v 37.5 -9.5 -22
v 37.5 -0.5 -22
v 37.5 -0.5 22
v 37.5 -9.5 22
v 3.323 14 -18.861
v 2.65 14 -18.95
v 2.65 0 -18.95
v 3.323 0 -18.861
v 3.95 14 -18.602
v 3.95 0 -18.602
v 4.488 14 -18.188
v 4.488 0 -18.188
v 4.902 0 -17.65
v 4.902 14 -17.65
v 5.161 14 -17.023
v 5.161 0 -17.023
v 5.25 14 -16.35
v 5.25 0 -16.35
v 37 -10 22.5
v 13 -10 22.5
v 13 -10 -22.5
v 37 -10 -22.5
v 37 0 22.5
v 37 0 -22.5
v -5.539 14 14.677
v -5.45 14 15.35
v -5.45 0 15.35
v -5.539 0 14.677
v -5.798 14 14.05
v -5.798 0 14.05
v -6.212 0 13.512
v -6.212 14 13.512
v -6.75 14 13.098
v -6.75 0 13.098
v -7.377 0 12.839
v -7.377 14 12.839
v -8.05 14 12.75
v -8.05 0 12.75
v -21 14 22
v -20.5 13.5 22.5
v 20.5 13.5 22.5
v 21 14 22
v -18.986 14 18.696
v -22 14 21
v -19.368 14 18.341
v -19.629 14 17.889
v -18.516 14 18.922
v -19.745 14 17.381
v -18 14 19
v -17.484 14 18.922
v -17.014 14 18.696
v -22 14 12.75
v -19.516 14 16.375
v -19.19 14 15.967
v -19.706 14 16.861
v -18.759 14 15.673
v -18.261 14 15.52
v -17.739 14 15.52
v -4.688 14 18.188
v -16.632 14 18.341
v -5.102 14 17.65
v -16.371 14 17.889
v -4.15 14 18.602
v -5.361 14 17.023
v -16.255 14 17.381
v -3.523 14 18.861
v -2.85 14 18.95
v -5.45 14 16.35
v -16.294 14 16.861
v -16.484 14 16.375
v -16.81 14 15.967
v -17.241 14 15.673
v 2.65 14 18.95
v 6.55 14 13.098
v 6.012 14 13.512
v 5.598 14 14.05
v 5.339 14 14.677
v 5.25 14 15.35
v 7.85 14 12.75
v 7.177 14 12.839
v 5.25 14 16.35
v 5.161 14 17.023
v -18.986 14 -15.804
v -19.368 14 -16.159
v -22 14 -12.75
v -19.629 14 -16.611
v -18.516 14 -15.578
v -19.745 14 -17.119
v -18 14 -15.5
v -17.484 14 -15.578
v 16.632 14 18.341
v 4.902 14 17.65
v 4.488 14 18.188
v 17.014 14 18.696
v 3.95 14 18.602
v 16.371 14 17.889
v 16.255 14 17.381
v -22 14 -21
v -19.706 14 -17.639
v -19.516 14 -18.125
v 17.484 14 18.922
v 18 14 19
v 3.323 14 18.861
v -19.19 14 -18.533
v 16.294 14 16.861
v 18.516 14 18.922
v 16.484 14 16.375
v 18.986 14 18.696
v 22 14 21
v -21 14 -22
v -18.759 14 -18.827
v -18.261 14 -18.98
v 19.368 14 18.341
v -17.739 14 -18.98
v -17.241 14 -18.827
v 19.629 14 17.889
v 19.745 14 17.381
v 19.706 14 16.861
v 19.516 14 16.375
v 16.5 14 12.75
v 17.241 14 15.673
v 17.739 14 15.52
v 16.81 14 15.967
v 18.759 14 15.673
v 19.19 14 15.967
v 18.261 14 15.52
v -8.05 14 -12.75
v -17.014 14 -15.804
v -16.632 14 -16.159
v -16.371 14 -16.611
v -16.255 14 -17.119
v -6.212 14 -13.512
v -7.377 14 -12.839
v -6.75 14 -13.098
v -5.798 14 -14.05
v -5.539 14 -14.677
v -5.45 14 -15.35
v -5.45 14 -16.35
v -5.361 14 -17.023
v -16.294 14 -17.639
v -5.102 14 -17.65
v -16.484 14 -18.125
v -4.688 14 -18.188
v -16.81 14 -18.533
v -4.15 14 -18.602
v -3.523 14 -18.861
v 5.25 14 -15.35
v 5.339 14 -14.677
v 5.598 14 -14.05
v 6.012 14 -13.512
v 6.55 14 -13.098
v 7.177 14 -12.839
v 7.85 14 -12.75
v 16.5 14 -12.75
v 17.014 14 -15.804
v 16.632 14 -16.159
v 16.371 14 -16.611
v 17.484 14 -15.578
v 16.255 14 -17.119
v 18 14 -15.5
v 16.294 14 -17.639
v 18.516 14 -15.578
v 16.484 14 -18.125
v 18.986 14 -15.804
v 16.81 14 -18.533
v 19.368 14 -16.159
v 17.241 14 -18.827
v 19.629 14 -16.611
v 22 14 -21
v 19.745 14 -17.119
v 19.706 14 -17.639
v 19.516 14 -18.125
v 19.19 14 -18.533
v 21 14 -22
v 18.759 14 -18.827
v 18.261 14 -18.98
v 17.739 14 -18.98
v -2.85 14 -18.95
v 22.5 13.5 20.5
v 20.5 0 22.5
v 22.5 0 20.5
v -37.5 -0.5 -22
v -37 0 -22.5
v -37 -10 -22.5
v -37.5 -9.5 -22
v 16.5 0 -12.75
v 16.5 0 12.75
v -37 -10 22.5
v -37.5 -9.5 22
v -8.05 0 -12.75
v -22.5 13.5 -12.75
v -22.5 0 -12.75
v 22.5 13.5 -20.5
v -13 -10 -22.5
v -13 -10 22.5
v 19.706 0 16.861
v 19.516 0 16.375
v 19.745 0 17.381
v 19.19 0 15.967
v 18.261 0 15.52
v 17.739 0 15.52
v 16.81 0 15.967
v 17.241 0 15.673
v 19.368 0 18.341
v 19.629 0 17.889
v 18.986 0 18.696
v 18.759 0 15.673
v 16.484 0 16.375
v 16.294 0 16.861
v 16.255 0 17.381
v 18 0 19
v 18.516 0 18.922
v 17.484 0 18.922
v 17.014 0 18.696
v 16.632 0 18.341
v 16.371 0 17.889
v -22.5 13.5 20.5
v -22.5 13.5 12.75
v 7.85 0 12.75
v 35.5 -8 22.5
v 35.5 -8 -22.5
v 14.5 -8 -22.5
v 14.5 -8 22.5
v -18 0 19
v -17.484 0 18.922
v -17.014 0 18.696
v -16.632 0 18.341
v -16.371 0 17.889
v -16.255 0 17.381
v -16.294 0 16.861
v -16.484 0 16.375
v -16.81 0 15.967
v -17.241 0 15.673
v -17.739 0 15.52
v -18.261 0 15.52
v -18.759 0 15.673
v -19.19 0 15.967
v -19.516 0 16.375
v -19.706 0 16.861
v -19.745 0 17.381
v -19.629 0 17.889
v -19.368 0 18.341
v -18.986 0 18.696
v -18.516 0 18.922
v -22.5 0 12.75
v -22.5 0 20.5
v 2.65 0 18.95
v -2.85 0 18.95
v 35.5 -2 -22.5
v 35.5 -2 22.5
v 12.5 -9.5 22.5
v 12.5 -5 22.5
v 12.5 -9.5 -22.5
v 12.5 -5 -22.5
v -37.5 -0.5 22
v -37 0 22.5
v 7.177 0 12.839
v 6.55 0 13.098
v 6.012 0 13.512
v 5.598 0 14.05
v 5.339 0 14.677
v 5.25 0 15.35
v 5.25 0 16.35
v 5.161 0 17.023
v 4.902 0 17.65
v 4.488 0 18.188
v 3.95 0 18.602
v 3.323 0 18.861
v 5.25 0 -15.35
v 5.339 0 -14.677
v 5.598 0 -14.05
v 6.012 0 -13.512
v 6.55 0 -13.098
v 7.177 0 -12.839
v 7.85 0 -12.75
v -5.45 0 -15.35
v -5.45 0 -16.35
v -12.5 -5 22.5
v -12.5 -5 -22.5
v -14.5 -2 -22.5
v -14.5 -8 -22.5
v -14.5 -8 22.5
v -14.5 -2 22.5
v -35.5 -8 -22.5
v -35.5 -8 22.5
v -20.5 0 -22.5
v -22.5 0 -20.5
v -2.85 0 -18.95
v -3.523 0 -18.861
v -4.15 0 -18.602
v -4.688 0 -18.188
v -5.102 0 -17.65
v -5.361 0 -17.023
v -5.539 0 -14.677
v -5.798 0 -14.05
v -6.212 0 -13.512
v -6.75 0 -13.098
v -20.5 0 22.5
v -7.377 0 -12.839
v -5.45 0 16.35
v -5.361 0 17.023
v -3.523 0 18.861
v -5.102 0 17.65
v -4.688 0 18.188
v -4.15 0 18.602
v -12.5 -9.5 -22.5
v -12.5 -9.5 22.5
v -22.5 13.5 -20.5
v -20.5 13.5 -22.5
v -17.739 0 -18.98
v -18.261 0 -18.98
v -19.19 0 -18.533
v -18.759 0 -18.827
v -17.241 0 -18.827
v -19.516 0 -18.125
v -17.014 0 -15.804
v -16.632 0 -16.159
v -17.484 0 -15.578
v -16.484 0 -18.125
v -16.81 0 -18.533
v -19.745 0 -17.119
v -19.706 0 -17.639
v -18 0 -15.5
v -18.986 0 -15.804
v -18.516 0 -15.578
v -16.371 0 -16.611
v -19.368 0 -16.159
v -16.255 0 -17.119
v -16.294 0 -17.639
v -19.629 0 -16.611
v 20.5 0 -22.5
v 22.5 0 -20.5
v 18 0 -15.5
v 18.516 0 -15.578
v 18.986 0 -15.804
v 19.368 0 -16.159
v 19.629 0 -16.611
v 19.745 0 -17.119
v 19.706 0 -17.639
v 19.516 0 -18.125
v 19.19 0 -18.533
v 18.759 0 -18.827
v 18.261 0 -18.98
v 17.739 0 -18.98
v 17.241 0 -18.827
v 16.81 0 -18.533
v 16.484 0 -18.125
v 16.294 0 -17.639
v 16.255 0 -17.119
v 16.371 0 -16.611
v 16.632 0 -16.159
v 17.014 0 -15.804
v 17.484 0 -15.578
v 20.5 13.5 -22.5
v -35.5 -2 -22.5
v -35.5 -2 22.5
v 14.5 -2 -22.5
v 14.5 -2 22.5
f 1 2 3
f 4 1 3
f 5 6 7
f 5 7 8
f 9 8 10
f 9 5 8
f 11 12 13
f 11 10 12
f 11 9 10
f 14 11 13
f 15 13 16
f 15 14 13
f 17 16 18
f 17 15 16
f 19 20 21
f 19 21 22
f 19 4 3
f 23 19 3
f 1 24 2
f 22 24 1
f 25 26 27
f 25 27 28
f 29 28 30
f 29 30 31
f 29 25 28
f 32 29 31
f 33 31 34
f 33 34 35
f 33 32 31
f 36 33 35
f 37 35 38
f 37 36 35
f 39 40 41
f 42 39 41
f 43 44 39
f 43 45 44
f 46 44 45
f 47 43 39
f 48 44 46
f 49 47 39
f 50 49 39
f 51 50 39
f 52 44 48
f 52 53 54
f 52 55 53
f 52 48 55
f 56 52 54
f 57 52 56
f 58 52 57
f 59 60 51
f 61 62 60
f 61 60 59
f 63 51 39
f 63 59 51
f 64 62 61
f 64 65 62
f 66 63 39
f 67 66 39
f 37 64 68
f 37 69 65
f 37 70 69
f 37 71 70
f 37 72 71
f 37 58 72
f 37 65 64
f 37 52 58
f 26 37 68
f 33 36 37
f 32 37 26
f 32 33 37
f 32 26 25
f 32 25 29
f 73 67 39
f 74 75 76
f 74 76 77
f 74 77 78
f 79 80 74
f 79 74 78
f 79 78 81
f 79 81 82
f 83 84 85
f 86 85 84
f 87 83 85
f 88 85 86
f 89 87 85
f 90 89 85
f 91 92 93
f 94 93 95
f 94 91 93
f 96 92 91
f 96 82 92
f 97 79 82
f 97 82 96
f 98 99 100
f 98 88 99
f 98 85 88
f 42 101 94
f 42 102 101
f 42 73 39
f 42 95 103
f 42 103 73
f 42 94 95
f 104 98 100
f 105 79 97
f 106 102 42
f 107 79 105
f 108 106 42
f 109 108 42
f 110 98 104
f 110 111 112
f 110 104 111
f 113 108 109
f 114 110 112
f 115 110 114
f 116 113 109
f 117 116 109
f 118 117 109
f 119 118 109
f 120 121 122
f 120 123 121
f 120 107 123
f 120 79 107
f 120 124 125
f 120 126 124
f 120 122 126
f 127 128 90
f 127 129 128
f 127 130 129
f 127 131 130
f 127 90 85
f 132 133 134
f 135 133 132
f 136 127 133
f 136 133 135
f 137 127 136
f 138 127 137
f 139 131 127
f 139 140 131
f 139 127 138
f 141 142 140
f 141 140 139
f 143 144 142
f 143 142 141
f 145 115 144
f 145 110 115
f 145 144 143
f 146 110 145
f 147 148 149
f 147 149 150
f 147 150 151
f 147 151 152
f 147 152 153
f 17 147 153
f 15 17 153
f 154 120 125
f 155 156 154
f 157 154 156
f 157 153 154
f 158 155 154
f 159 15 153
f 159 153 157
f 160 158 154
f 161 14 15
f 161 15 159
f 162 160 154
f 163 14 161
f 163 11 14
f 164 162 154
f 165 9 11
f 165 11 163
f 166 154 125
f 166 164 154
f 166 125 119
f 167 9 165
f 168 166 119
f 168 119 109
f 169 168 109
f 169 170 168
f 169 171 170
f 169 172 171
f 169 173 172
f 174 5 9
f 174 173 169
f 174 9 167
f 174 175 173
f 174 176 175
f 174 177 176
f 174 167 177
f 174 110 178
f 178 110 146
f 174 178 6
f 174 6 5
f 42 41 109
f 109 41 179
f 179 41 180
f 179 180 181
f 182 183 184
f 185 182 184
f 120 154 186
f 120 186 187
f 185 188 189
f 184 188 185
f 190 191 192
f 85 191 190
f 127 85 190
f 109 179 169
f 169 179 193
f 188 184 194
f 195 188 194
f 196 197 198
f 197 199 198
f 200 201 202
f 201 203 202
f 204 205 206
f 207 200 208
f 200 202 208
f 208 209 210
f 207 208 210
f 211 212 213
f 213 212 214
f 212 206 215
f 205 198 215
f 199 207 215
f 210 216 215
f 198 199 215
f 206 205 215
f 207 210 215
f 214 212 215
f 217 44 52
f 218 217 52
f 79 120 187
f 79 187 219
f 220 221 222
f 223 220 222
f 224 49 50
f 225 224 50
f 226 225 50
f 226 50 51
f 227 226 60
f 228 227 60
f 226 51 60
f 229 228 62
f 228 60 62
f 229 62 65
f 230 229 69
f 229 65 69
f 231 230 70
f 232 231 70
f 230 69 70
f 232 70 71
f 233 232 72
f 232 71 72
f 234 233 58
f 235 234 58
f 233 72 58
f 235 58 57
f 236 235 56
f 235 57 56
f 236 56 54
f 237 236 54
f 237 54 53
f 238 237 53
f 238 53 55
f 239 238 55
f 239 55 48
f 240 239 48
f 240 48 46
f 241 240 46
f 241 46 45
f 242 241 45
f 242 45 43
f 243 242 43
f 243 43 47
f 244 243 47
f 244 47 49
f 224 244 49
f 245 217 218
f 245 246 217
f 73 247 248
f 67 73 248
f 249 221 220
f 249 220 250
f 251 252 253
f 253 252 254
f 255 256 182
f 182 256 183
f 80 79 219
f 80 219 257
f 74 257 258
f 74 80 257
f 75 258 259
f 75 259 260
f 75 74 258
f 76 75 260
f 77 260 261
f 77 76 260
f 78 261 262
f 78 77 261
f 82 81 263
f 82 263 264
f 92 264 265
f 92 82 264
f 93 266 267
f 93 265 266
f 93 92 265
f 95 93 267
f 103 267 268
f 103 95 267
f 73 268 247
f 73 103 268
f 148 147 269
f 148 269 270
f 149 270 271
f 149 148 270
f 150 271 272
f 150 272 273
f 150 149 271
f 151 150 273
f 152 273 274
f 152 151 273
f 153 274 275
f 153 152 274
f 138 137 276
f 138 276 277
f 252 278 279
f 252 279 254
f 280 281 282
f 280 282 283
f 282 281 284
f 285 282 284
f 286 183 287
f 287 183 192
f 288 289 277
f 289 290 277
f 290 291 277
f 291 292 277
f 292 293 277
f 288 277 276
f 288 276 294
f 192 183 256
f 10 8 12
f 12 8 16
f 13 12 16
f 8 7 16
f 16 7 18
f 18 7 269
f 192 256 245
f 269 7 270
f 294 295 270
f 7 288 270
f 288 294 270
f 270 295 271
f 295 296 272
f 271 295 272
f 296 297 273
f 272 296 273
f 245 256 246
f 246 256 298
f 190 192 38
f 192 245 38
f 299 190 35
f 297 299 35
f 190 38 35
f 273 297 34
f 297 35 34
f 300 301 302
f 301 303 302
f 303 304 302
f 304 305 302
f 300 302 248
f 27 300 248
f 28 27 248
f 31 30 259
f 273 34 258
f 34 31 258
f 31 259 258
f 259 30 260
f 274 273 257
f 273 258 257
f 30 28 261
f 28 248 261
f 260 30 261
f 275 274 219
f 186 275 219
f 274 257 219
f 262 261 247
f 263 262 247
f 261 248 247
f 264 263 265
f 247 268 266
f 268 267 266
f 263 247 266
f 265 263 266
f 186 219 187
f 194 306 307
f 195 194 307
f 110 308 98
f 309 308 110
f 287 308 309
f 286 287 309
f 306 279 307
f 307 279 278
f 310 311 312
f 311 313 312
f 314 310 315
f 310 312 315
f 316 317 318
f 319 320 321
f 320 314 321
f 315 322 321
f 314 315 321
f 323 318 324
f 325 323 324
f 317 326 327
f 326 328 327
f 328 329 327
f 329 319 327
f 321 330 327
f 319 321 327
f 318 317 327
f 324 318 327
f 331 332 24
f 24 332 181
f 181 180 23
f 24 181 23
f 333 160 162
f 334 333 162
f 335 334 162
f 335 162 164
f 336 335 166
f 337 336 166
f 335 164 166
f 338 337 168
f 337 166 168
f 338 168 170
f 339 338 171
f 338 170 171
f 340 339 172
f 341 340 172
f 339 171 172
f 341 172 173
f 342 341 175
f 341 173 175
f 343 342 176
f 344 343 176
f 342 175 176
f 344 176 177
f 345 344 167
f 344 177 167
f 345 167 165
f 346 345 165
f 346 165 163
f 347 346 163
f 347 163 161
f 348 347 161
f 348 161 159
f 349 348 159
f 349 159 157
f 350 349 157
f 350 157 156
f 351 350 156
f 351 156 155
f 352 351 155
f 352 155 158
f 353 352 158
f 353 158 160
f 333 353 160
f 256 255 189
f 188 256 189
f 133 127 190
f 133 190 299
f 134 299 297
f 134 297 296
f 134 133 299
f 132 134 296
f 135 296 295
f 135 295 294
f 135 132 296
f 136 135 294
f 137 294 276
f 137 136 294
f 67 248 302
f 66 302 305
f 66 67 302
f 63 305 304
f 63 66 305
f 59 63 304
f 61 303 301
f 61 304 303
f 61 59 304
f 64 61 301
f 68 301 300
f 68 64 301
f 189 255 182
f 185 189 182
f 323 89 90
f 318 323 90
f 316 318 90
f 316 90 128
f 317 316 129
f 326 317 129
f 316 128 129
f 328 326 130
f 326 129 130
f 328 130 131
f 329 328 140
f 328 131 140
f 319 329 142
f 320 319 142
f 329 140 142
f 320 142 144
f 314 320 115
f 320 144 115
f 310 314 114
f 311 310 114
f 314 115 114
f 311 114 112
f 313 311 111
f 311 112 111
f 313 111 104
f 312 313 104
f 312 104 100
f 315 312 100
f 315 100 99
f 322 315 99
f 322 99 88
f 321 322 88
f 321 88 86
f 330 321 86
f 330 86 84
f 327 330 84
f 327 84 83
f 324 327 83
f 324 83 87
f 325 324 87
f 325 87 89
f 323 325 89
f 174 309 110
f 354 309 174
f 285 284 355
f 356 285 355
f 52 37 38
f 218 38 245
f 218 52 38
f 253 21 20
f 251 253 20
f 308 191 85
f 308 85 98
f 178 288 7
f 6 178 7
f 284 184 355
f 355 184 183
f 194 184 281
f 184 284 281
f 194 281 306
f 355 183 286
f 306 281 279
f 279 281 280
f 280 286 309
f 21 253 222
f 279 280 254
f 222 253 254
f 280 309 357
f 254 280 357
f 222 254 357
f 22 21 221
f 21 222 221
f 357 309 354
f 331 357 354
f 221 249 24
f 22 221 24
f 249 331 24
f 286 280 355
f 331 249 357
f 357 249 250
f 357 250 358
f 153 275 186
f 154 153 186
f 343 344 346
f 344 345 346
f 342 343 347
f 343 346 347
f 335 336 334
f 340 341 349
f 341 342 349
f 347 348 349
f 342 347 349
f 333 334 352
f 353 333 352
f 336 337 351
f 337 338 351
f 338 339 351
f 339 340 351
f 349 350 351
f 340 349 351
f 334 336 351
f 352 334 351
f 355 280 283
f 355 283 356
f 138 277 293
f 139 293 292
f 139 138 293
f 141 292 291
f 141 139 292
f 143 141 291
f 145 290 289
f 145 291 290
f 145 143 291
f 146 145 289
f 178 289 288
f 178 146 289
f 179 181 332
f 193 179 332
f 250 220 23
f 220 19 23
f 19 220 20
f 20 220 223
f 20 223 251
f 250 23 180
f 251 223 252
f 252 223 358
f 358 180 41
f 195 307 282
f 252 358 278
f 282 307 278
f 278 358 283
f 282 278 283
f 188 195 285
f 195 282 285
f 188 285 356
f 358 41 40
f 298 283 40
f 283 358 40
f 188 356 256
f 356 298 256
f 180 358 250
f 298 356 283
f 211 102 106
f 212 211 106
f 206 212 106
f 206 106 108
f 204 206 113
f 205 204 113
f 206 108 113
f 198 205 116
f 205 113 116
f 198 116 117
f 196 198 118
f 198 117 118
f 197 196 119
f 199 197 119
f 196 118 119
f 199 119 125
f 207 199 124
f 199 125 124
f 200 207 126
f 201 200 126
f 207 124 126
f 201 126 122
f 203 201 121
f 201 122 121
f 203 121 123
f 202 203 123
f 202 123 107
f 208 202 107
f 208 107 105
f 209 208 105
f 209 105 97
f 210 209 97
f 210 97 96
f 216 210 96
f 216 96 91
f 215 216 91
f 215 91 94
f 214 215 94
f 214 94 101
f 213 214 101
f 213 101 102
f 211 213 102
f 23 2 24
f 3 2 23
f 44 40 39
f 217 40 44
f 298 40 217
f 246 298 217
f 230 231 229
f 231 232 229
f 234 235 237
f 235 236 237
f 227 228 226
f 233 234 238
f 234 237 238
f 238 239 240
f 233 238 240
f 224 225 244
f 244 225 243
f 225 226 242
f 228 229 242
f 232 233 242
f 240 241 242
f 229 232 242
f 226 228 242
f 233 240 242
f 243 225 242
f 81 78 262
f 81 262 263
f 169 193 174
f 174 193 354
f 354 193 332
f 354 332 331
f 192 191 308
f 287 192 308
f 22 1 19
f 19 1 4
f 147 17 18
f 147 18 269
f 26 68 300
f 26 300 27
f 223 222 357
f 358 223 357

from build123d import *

# Parameters (mm, degrees)
SKETCH1_W           = 45
SKETCH1_H           = 45
BOSS_EXTRUDE1_DEPTH = 14
CUT_EXTRUDE1_DEPTH  = 35.763486592
CHAMFER1_SIZE       = 0.5
CHAMFER2_SIZE       = 2
SKETCH4_R           = 1.75
CUT_EXTRUDE2_DEPTH  = 35.763486592
SKETCH5_R           = 1.75
SKETCH5_W           = 4
SKETCH5_H           = 25.5
BOSS_EXTRUDE4_DEPTH = 5
SKETCH5_3_R         = 1.75
SKETCH5_3_W         = 4
SKETCH5_3_H         = 25.5
BOSS_EXTRUDE5_DEPTH = 10
SKETCH10_W          = 21
SKETCH10_H          = 6
CUT_EXTRUDE3_DEPTH  = 50
CHAMFER5_SIZE       = 0.5


with BuildPart() as part:
    # Sketch1 → Boss-Extrude1 (new body)
    with BuildSketch(Plane(origin=(0, 0, 0), x_dir=(1, 0, 0), z_dir=(0, 1, 0))):
        Rectangle(SKETCH1_W, SKETCH1_H)
    extrude(amount=BOSS_EXTRUDE1_DEPTH)

    # Sketch3 → Cut-Extrude1 (cut, through all)
    with BuildSketch(Plane(origin=(0, 14, 0), x_dir=(1, 0, 0), z_dir=(0, 1, 0))):
        with BuildLine():
            Line((-22.5, 12.75), (-8.05, 12.75))
            ThreePointArc((-8.05, 12.75), (-6.211522369, 13.511522369), (-5.45, 15.35))
            Line((-5.45, 15.35), (-5.45, 16.35))
            ThreePointArc((-5.45, 16.35), (-4.688477631, 18.188477631), (-2.85, 18.95))
            Line((-2.85, 18.95), (2.65, 18.95))
            ThreePointArc((2.65, 18.95), (4.488477631, 18.188477631), (5.25, 16.35))
            Line((5.25, 16.35), (5.25, 15.35))
            ThreePointArc((5.25, 15.35), (6.011522369, 13.511522369), (7.85, 12.75))
            Line((7.85, 12.75), (16.5, 12.75))
            Line((16.5, 12.75), (16.5, -12.75))
            Line((16.5, -12.75), (7.85, -12.75))
            ThreePointArc((7.85, -12.75), (6.011522369, -13.511522369), (5.25, -15.35))
            Line((5.25, -15.35), (5.25, -16.35))
            ThreePointArc((5.25, -16.35), (4.488477631, -18.188477631), (2.65, -18.95))
            Line((2.65, -18.95), (-2.85, -18.95))
            ThreePointArc((-2.85, -18.95), (-4.688477631, -18.188477631), (-5.45, -16.35))
            Line((-5.45, -16.35), (-5.45, -15.35))
            ThreePointArc((-5.45, -15.35), (-6.211522369, -13.511522369), (-8.05, -12.75))
            Line((-8.05, -12.75), (-22.5, -12.75))
            Line((-22.5, -12.75), (-22.5, 12.75))
        make_face()
    extrude(amount=-CUT_EXTRUDE1_DEPTH, mode=Mode.SUBTRACT)

    # Chamfer1
    chamfer1_edges = [part.edges().sort_by_distance(p)[0] for p in [
        (-22.5, 14, -17.625),
        (0, 14, 22.5),
        (-22.5, 14, 17.625),
        (22.5, 14, 0),
        (0, 14, -22.5),
    ]]
    chamfer(chamfer1_edges, length=CHAMFER1_SIZE)

    # Chamfer2
    # the kernel refuses this chamfer: 5.464101615, 2 mm, written as the material it takes off along each edge
    # the kernel refuses this chamfer: 5.464101615, 2 mm, written as the material it takes off along each edge
    with BuildSketch(Plane(origin=(-22.5, -5.143365976, -22.5), x_dir=(-0.027495876610585647, 0, 0.9996219169112968), z_dir=(0, 1, 0)), Plane(origin=(-22.5, -5.143365976, 22.5), x_dir=(0.9996219169112968, 0, 0.027495876610585647), z_dir=(0, 1, 0))) as chamfer2_2_piece_1:
        Polygon((CHAMFER2_SIZE * 0.999621916911, CHAMFER2_SIZE * 0.0274958766106), (-CHAMFER2_SIZE * 0.0274958766106, CHAMFER2_SIZE * 0.999621916911), (0, 0), align=None)
    extrude(amount=23.786731952, mode=Mode.SUBTRACT)
    with BuildSketch(Plane(origin=(22.5, -5.143365976, 22.5), x_dir=(-0.9996219169112968, 0, 0.027495876610585647), z_dir=(0, 1, 0)), Plane(origin=(22.5, -5.143365976, -22.5), x_dir=(0.027495876610585647, 0, 0.9996219169112968), z_dir=(0, 1, 0))) as chamfer2_2_piece_2:
        Polygon((CHAMFER2_SIZE * 0.999621916911, -CHAMFER2_SIZE * 0.0274958766106), (-CHAMFER2_SIZE * 0.0274958766106, -CHAMFER2_SIZE * 0.999621916911), (0, 0), align=None)
    extrude(amount=23.786731952, mode=Mode.SUBTRACT)

    # Sketch4 → Cut-Extrude2 (cut, through all)
    with BuildSketch(Plane(origin=(0, 14, 0), x_dir=(1, 0, 0), z_dir=(0, 1, 0))):
        with Locations(Location((-18, 17.25, 0), (0, 0, 270))):
            Circle(SKETCH4_R)
        with Locations(Location((18, 17.25, 0), (0, 0, 270))):
            Circle(SKETCH4_R)
        with Locations(Location((18, -17.25, 0), (0, 0, 270))):
            Circle(SKETCH4_R)
        with Locations(Location((-18, -17.25, 0), (0, 0, 270))):
            Circle(SKETCH4_R)
    extrude(amount=-CUT_EXTRUDE2_DEPTH, mode=Mode.SUBTRACT)

    # Sketch5 → Boss-Extrude4 (add)
    # profile 1 of 13: a face of its own
    with BuildSketch(Plane.XZ):
        Polygon((-20.5, 22.5), (-37.5, 22.5), (-37.5, -22.5), (-20.5, -22.5), (-22.5, -20.5), (-22.5, -12.75), (-12.5, -12.75), (-12.5, 12.75), (-22.5, 12.75), (-22.5, 20.5), align=None)
    # profile 2 of 13: a face of its own
    with BuildSketch(Plane.XZ):
        with BuildLine():
            Line((-8.05, 12.75), (-12.5, 12.75))
            Line((-12.5, 12.75), (-12.5, -12.75))
            Line((-12.5, -12.75), (-8.05, -12.75))
            ThreePointArc((-8.05, -12.75), (-6.211522369, -13.511522369), (-5.45, -15.35))
            Line((-5.45, -15.35), (-5.45, -16.35))
            ThreePointArc((-5.45, -16.35), (-4.688477631, -18.188477631), (-2.85, -18.95))
            Line((-2.85, -18.95), (2.65, -18.95))
            ThreePointArc((2.65, -18.95), (4.488477631, -18.188477631), (5.25, -16.35))
            Line((5.25, -16.35), (5.25, -15.35))
            ThreePointArc((5.25, -15.35), (6.011522369, -13.511522369), (7.85, -12.75))
            Line((7.85, -12.75), (12.5, -12.75))
            Line((12.5, -12.75), (12.5, 12.75))
            Line((12.5, 12.75), (7.85, 12.75))
            ThreePointArc((7.85, 12.75), (6.011522369, 13.511522369), (5.25, 15.35))
            Line((5.25, 15.35), (5.25, 16.35))
            ThreePointArc((5.25, 16.35), (4.488477631, 18.188477631), (2.65, 18.95))
            Line((2.65, 18.95), (-2.85, 18.95))
            ThreePointArc((-2.85, 18.95), (-4.688477631, 18.188477631), (-5.45, 16.35))
            Line((-5.45, 16.35), (-5.45, 15.35))
            ThreePointArc((-5.45, 15.35), (-6.211522369, 13.511522369), (-8.05, 12.75))
        make_face()
    # profile 3 of 13: a face of its own
    with BuildSketch(Plane.XZ):
        with BuildLine():
            Line((12.5, 22.5), (-12.5, 22.5))
            Line((-12.5, 22.5), (-12.5, 12.75))
            Line((-12.5, 12.75), (-8.05, 12.75))
            ThreePointArc((-8.05, 12.75), (-6.211522369, 13.511522369), (-5.45, 15.35))
            Line((-5.45, 15.35), (-5.45, 16.35))
            ThreePointArc((-5.45, 16.35), (-4.688477631, 18.188477631), (-2.85, 18.95))
            Line((-2.85, 18.95), (2.65, 18.95))
            ThreePointArc((2.65, 18.95), (4.488477631, 18.188477631), (5.25, 16.35))
            Line((5.25, 16.35), (5.25, 15.35))
            ThreePointArc((5.25, 15.35), (6.011522369, 13.511522369), (7.85, 12.75))
            Line((7.85, 12.75), (12.5, 12.75))
            Line((12.5, 12.75), (12.5, 22.5))
        make_face()
    # profile 4 of 13: a face of its own
    with BuildSketch(Plane.XZ):
        Polygon((-12.5, 22.5), (-20.5, 22.5), (-22.5, 20.5), (-22.5, 12.75), (-12.5, 12.75), align=None)
        with Locations(Location((-18, 17.25, 0), (0, 0, 90))):
            Circle(SKETCH5_R, mode=Mode.SUBTRACT)
    # profile 5 of 13: a face of its own
    with BuildSketch(Plane.XZ):
        Polygon((20.5, 22.5), (12.5, 22.5), (12.5, 12.75), (16.5, 12.75), (16.5, -12.75), (12.5, -12.75), (12.5, -22.5), (20.5, -22.5), (22.5, -20.5), (22.5, 20.5), align=None)
        with Locations(Location((18, -17.25, 0), (0, 0, 90))):
            Circle(SKETCH5_R, mode=Mode.SUBTRACT)
        with Locations(Location((18, 17.25, 0), (0, 0, 90))):
            Circle(SKETCH5_R, mode=Mode.SUBTRACT)
    # profile 6 of 13: a face of its own
    with BuildSketch(Plane.XZ):
        Polygon((37.5, 22.5), (20.5, 22.5), (22.5, 20.5), (22.5, -20.5), (20.5, -22.5), (37.5, -22.5), align=None)
    # profile 7 of 13: a face of its own
    with BuildSketch(Plane.XZ):
        with BuildLine():
            Line((-12.5, -12.75), (-12.5, -22.5))
            Line((-12.5, -22.5), (12.5, -22.5))
            Line((12.5, -22.5), (12.5, -12.75))
            Line((12.5, -12.75), (7.85, -12.75))
            ThreePointArc((7.85, -12.75), (6.011522369, -13.511522369), (5.25, -15.35))
            Line((5.25, -15.35), (5.25, -16.35))
            ThreePointArc((5.25, -16.35), (4.488477631, -18.188477631), (2.65, -18.95))
            Line((2.65, -18.95), (-2.85, -18.95))
            ThreePointArc((-2.85, -18.95), (-4.688477631, -18.188477631), (-5.45, -16.35))
            Line((-5.45, -16.35), (-5.45, -15.35))
            ThreePointArc((-5.45, -15.35), (-6.211522369, -13.511522369), (-8.05, -12.75))
            Line((-8.05, -12.75), (-12.5, -12.75))
        make_face()
    # profile 8 of 13: a face of its own
    with BuildSketch(Plane.XZ):
        Polygon((-22.5, -20.5), (-20.5, -22.5), (-12.5, -22.5), (-12.5, -12.75), (-22.5, -12.75), align=None)
        with Locations(Location((-18, -17.25, 0), (0, 0, 90))):
            Circle(SKETCH5_R, mode=Mode.SUBTRACT)
    # profile 9 of 13: a face of its own
    with BuildSketch(Plane.XZ):
        with Locations((14.5, 0)):
            Rectangle(SKETCH5_W, SKETCH5_H)
    # profile 10 of 13: a face of its own
    with BuildSketch(Plane.XZ):
        with Locations(Location((18, 17.25, 0), (0, 0, 90))):
            Circle(SKETCH5_R)
    # profile 11 of 13: a face of its own
    with BuildSketch(Plane.XZ):
        with Locations(Location((-18, 17.25, 0), (0, 0, 90))):
            Circle(SKETCH5_R)
    # profile 12 of 13: a face of its own
    with BuildSketch(Plane.XZ):
        with Locations(Location((-18, -17.25, 0), (0, 0, 90))):
            Circle(SKETCH5_R)
    # profile 13 of 13: a face of its own
    with BuildSketch(Plane.XZ):
        with Locations(Location((18, -17.25, 0), (0, 0, 90))):
            Circle(SKETCH5_R)
    extrude(amount=BOSS_EXTRUDE4_DEPTH)

    # Sketch5<3> → Boss-Extrude5 (add)
    # profile 1 of 10: a face of its own
    with BuildSketch(Plane.XZ):
        Polygon((-12.5, 22.5), (-20.5, 22.5), (-22.5, 20.5), (-22.5, 12.75), (-12.5, 12.75), align=None)
        with Locations(Location((-18, 17.25, 0), (0, 0, 90))):
            Circle(SKETCH5_3_R, mode=Mode.SUBTRACT)
    # profile 2 of 10: a face of its own
    with BuildSketch(Plane.XZ):
        Polygon((-20.5, 22.5), (-37.5, 22.5), (-37.5, -22.5), (-20.5, -22.5), (-22.5, -20.5), (-22.5, -12.75), (-12.5, -12.75), (-12.5, 12.75), (-22.5, 12.75), (-22.5, 20.5), align=None)
    # profile 3 of 10: a face of its own
    with BuildSketch(Plane.XZ):
        Polygon((-22.5, -20.5), (-20.5, -22.5), (-12.5, -22.5), (-12.5, -12.75), (-22.5, -12.75), align=None)
        with Locations(Location((-18, -17.25, 0), (0, 0, 90))):
            Circle(SKETCH5_3_R, mode=Mode.SUBTRACT)
    # profile 4 of 10: a face of its own
    with BuildSketch(Plane.XZ):
        with Locations(Location((-18, 17.25, 0), (0, 0, 90))):
            Circle(SKETCH5_3_R)
    # profile 5 of 10: a face of its own
    with BuildSketch(Plane.XZ):
        with Locations(Location((-18, -17.25, 0), (0, 0, 90))):
            Circle(SKETCH5_3_R)
    # profile 6 of 10: a face of its own
    with BuildSketch(Plane.XZ):
        Polygon((20.5, 22.5), (12.5, 22.5), (12.5, 12.75), (16.5, 12.75), (16.5, -12.75), (12.5, -12.75), (12.5, -22.5), (20.5, -22.5), (22.5, -20.5), (22.5, 20.5), align=None)
        with Locations(Location((18, -17.25, 0), (0, 0, 90))):
            Circle(SKETCH5_3_R, mode=Mode.SUBTRACT)
        with Locations(Location((18, 17.25, 0), (0, 0, 90))):
            Circle(SKETCH5_3_R, mode=Mode.SUBTRACT)
    # profile 7 of 10: a face of its own
    with BuildSketch(Plane.XZ):
        Polygon((37.5, 22.5), (20.5, 22.5), (22.5, 20.5), (22.5, -20.5), (20.5, -22.5), (37.5, -22.5), align=None)
    # profile 8 of 10: a face of its own
    with BuildSketch(Plane.XZ):
        with Locations((14.5, 0)):
            Rectangle(SKETCH5_3_W, SKETCH5_3_H)
    # profile 9 of 10: a face of its own
    with BuildSketch(Plane.XZ):
        with Locations(Location((18, 17.25, 0), (0, 0, 90))):
            Circle(SKETCH5_3_R)
    # profile 10 of 10: a face of its own
    with BuildSketch(Plane.XZ):
        with Locations(Location((18, -17.25, 0), (0, 0, 90))):
            Circle(SKETCH5_3_R)
    extrude(amount=BOSS_EXTRUDE5_DEPTH)

    # Sketch10 → Cut-Extrude3 (cut)
    with BuildSketch(Plane(origin=(0, 0, -22.5), x_dir=(-1, 0, 0), z_dir=(0, 0, -1))):
        with Locations((-25, -5)):
            Rectangle(SKETCH10_W, SKETCH10_H)
        with Locations((25, -5)):
            Rectangle(SKETCH10_W, SKETCH10_H)
    extrude(amount=-CUT_EXTRUDE3_DEPTH, mode=Mode.SUBTRACT)

    # Chamfer5
    chamfer5_edges = [part.edges().sort_by_distance(p)[0] for p in [
        (37.5, 0, 0),
        (-37.5, -5, -22.5),
        (37.5, -5, -22.5),
        (37.5, -5, 22.5),
        (-37.5, 0, 0),
        (-37.5, -5, 22.5),
        (-12.5, -10, 0),
        (-37.5, -10, 0),
        (37.5, -10, 0),
        (12.5, -10, 0),
    ]]
    chamfer(chamfer5_edges, length=CHAMFER5_SIZE)


solid = part.part
